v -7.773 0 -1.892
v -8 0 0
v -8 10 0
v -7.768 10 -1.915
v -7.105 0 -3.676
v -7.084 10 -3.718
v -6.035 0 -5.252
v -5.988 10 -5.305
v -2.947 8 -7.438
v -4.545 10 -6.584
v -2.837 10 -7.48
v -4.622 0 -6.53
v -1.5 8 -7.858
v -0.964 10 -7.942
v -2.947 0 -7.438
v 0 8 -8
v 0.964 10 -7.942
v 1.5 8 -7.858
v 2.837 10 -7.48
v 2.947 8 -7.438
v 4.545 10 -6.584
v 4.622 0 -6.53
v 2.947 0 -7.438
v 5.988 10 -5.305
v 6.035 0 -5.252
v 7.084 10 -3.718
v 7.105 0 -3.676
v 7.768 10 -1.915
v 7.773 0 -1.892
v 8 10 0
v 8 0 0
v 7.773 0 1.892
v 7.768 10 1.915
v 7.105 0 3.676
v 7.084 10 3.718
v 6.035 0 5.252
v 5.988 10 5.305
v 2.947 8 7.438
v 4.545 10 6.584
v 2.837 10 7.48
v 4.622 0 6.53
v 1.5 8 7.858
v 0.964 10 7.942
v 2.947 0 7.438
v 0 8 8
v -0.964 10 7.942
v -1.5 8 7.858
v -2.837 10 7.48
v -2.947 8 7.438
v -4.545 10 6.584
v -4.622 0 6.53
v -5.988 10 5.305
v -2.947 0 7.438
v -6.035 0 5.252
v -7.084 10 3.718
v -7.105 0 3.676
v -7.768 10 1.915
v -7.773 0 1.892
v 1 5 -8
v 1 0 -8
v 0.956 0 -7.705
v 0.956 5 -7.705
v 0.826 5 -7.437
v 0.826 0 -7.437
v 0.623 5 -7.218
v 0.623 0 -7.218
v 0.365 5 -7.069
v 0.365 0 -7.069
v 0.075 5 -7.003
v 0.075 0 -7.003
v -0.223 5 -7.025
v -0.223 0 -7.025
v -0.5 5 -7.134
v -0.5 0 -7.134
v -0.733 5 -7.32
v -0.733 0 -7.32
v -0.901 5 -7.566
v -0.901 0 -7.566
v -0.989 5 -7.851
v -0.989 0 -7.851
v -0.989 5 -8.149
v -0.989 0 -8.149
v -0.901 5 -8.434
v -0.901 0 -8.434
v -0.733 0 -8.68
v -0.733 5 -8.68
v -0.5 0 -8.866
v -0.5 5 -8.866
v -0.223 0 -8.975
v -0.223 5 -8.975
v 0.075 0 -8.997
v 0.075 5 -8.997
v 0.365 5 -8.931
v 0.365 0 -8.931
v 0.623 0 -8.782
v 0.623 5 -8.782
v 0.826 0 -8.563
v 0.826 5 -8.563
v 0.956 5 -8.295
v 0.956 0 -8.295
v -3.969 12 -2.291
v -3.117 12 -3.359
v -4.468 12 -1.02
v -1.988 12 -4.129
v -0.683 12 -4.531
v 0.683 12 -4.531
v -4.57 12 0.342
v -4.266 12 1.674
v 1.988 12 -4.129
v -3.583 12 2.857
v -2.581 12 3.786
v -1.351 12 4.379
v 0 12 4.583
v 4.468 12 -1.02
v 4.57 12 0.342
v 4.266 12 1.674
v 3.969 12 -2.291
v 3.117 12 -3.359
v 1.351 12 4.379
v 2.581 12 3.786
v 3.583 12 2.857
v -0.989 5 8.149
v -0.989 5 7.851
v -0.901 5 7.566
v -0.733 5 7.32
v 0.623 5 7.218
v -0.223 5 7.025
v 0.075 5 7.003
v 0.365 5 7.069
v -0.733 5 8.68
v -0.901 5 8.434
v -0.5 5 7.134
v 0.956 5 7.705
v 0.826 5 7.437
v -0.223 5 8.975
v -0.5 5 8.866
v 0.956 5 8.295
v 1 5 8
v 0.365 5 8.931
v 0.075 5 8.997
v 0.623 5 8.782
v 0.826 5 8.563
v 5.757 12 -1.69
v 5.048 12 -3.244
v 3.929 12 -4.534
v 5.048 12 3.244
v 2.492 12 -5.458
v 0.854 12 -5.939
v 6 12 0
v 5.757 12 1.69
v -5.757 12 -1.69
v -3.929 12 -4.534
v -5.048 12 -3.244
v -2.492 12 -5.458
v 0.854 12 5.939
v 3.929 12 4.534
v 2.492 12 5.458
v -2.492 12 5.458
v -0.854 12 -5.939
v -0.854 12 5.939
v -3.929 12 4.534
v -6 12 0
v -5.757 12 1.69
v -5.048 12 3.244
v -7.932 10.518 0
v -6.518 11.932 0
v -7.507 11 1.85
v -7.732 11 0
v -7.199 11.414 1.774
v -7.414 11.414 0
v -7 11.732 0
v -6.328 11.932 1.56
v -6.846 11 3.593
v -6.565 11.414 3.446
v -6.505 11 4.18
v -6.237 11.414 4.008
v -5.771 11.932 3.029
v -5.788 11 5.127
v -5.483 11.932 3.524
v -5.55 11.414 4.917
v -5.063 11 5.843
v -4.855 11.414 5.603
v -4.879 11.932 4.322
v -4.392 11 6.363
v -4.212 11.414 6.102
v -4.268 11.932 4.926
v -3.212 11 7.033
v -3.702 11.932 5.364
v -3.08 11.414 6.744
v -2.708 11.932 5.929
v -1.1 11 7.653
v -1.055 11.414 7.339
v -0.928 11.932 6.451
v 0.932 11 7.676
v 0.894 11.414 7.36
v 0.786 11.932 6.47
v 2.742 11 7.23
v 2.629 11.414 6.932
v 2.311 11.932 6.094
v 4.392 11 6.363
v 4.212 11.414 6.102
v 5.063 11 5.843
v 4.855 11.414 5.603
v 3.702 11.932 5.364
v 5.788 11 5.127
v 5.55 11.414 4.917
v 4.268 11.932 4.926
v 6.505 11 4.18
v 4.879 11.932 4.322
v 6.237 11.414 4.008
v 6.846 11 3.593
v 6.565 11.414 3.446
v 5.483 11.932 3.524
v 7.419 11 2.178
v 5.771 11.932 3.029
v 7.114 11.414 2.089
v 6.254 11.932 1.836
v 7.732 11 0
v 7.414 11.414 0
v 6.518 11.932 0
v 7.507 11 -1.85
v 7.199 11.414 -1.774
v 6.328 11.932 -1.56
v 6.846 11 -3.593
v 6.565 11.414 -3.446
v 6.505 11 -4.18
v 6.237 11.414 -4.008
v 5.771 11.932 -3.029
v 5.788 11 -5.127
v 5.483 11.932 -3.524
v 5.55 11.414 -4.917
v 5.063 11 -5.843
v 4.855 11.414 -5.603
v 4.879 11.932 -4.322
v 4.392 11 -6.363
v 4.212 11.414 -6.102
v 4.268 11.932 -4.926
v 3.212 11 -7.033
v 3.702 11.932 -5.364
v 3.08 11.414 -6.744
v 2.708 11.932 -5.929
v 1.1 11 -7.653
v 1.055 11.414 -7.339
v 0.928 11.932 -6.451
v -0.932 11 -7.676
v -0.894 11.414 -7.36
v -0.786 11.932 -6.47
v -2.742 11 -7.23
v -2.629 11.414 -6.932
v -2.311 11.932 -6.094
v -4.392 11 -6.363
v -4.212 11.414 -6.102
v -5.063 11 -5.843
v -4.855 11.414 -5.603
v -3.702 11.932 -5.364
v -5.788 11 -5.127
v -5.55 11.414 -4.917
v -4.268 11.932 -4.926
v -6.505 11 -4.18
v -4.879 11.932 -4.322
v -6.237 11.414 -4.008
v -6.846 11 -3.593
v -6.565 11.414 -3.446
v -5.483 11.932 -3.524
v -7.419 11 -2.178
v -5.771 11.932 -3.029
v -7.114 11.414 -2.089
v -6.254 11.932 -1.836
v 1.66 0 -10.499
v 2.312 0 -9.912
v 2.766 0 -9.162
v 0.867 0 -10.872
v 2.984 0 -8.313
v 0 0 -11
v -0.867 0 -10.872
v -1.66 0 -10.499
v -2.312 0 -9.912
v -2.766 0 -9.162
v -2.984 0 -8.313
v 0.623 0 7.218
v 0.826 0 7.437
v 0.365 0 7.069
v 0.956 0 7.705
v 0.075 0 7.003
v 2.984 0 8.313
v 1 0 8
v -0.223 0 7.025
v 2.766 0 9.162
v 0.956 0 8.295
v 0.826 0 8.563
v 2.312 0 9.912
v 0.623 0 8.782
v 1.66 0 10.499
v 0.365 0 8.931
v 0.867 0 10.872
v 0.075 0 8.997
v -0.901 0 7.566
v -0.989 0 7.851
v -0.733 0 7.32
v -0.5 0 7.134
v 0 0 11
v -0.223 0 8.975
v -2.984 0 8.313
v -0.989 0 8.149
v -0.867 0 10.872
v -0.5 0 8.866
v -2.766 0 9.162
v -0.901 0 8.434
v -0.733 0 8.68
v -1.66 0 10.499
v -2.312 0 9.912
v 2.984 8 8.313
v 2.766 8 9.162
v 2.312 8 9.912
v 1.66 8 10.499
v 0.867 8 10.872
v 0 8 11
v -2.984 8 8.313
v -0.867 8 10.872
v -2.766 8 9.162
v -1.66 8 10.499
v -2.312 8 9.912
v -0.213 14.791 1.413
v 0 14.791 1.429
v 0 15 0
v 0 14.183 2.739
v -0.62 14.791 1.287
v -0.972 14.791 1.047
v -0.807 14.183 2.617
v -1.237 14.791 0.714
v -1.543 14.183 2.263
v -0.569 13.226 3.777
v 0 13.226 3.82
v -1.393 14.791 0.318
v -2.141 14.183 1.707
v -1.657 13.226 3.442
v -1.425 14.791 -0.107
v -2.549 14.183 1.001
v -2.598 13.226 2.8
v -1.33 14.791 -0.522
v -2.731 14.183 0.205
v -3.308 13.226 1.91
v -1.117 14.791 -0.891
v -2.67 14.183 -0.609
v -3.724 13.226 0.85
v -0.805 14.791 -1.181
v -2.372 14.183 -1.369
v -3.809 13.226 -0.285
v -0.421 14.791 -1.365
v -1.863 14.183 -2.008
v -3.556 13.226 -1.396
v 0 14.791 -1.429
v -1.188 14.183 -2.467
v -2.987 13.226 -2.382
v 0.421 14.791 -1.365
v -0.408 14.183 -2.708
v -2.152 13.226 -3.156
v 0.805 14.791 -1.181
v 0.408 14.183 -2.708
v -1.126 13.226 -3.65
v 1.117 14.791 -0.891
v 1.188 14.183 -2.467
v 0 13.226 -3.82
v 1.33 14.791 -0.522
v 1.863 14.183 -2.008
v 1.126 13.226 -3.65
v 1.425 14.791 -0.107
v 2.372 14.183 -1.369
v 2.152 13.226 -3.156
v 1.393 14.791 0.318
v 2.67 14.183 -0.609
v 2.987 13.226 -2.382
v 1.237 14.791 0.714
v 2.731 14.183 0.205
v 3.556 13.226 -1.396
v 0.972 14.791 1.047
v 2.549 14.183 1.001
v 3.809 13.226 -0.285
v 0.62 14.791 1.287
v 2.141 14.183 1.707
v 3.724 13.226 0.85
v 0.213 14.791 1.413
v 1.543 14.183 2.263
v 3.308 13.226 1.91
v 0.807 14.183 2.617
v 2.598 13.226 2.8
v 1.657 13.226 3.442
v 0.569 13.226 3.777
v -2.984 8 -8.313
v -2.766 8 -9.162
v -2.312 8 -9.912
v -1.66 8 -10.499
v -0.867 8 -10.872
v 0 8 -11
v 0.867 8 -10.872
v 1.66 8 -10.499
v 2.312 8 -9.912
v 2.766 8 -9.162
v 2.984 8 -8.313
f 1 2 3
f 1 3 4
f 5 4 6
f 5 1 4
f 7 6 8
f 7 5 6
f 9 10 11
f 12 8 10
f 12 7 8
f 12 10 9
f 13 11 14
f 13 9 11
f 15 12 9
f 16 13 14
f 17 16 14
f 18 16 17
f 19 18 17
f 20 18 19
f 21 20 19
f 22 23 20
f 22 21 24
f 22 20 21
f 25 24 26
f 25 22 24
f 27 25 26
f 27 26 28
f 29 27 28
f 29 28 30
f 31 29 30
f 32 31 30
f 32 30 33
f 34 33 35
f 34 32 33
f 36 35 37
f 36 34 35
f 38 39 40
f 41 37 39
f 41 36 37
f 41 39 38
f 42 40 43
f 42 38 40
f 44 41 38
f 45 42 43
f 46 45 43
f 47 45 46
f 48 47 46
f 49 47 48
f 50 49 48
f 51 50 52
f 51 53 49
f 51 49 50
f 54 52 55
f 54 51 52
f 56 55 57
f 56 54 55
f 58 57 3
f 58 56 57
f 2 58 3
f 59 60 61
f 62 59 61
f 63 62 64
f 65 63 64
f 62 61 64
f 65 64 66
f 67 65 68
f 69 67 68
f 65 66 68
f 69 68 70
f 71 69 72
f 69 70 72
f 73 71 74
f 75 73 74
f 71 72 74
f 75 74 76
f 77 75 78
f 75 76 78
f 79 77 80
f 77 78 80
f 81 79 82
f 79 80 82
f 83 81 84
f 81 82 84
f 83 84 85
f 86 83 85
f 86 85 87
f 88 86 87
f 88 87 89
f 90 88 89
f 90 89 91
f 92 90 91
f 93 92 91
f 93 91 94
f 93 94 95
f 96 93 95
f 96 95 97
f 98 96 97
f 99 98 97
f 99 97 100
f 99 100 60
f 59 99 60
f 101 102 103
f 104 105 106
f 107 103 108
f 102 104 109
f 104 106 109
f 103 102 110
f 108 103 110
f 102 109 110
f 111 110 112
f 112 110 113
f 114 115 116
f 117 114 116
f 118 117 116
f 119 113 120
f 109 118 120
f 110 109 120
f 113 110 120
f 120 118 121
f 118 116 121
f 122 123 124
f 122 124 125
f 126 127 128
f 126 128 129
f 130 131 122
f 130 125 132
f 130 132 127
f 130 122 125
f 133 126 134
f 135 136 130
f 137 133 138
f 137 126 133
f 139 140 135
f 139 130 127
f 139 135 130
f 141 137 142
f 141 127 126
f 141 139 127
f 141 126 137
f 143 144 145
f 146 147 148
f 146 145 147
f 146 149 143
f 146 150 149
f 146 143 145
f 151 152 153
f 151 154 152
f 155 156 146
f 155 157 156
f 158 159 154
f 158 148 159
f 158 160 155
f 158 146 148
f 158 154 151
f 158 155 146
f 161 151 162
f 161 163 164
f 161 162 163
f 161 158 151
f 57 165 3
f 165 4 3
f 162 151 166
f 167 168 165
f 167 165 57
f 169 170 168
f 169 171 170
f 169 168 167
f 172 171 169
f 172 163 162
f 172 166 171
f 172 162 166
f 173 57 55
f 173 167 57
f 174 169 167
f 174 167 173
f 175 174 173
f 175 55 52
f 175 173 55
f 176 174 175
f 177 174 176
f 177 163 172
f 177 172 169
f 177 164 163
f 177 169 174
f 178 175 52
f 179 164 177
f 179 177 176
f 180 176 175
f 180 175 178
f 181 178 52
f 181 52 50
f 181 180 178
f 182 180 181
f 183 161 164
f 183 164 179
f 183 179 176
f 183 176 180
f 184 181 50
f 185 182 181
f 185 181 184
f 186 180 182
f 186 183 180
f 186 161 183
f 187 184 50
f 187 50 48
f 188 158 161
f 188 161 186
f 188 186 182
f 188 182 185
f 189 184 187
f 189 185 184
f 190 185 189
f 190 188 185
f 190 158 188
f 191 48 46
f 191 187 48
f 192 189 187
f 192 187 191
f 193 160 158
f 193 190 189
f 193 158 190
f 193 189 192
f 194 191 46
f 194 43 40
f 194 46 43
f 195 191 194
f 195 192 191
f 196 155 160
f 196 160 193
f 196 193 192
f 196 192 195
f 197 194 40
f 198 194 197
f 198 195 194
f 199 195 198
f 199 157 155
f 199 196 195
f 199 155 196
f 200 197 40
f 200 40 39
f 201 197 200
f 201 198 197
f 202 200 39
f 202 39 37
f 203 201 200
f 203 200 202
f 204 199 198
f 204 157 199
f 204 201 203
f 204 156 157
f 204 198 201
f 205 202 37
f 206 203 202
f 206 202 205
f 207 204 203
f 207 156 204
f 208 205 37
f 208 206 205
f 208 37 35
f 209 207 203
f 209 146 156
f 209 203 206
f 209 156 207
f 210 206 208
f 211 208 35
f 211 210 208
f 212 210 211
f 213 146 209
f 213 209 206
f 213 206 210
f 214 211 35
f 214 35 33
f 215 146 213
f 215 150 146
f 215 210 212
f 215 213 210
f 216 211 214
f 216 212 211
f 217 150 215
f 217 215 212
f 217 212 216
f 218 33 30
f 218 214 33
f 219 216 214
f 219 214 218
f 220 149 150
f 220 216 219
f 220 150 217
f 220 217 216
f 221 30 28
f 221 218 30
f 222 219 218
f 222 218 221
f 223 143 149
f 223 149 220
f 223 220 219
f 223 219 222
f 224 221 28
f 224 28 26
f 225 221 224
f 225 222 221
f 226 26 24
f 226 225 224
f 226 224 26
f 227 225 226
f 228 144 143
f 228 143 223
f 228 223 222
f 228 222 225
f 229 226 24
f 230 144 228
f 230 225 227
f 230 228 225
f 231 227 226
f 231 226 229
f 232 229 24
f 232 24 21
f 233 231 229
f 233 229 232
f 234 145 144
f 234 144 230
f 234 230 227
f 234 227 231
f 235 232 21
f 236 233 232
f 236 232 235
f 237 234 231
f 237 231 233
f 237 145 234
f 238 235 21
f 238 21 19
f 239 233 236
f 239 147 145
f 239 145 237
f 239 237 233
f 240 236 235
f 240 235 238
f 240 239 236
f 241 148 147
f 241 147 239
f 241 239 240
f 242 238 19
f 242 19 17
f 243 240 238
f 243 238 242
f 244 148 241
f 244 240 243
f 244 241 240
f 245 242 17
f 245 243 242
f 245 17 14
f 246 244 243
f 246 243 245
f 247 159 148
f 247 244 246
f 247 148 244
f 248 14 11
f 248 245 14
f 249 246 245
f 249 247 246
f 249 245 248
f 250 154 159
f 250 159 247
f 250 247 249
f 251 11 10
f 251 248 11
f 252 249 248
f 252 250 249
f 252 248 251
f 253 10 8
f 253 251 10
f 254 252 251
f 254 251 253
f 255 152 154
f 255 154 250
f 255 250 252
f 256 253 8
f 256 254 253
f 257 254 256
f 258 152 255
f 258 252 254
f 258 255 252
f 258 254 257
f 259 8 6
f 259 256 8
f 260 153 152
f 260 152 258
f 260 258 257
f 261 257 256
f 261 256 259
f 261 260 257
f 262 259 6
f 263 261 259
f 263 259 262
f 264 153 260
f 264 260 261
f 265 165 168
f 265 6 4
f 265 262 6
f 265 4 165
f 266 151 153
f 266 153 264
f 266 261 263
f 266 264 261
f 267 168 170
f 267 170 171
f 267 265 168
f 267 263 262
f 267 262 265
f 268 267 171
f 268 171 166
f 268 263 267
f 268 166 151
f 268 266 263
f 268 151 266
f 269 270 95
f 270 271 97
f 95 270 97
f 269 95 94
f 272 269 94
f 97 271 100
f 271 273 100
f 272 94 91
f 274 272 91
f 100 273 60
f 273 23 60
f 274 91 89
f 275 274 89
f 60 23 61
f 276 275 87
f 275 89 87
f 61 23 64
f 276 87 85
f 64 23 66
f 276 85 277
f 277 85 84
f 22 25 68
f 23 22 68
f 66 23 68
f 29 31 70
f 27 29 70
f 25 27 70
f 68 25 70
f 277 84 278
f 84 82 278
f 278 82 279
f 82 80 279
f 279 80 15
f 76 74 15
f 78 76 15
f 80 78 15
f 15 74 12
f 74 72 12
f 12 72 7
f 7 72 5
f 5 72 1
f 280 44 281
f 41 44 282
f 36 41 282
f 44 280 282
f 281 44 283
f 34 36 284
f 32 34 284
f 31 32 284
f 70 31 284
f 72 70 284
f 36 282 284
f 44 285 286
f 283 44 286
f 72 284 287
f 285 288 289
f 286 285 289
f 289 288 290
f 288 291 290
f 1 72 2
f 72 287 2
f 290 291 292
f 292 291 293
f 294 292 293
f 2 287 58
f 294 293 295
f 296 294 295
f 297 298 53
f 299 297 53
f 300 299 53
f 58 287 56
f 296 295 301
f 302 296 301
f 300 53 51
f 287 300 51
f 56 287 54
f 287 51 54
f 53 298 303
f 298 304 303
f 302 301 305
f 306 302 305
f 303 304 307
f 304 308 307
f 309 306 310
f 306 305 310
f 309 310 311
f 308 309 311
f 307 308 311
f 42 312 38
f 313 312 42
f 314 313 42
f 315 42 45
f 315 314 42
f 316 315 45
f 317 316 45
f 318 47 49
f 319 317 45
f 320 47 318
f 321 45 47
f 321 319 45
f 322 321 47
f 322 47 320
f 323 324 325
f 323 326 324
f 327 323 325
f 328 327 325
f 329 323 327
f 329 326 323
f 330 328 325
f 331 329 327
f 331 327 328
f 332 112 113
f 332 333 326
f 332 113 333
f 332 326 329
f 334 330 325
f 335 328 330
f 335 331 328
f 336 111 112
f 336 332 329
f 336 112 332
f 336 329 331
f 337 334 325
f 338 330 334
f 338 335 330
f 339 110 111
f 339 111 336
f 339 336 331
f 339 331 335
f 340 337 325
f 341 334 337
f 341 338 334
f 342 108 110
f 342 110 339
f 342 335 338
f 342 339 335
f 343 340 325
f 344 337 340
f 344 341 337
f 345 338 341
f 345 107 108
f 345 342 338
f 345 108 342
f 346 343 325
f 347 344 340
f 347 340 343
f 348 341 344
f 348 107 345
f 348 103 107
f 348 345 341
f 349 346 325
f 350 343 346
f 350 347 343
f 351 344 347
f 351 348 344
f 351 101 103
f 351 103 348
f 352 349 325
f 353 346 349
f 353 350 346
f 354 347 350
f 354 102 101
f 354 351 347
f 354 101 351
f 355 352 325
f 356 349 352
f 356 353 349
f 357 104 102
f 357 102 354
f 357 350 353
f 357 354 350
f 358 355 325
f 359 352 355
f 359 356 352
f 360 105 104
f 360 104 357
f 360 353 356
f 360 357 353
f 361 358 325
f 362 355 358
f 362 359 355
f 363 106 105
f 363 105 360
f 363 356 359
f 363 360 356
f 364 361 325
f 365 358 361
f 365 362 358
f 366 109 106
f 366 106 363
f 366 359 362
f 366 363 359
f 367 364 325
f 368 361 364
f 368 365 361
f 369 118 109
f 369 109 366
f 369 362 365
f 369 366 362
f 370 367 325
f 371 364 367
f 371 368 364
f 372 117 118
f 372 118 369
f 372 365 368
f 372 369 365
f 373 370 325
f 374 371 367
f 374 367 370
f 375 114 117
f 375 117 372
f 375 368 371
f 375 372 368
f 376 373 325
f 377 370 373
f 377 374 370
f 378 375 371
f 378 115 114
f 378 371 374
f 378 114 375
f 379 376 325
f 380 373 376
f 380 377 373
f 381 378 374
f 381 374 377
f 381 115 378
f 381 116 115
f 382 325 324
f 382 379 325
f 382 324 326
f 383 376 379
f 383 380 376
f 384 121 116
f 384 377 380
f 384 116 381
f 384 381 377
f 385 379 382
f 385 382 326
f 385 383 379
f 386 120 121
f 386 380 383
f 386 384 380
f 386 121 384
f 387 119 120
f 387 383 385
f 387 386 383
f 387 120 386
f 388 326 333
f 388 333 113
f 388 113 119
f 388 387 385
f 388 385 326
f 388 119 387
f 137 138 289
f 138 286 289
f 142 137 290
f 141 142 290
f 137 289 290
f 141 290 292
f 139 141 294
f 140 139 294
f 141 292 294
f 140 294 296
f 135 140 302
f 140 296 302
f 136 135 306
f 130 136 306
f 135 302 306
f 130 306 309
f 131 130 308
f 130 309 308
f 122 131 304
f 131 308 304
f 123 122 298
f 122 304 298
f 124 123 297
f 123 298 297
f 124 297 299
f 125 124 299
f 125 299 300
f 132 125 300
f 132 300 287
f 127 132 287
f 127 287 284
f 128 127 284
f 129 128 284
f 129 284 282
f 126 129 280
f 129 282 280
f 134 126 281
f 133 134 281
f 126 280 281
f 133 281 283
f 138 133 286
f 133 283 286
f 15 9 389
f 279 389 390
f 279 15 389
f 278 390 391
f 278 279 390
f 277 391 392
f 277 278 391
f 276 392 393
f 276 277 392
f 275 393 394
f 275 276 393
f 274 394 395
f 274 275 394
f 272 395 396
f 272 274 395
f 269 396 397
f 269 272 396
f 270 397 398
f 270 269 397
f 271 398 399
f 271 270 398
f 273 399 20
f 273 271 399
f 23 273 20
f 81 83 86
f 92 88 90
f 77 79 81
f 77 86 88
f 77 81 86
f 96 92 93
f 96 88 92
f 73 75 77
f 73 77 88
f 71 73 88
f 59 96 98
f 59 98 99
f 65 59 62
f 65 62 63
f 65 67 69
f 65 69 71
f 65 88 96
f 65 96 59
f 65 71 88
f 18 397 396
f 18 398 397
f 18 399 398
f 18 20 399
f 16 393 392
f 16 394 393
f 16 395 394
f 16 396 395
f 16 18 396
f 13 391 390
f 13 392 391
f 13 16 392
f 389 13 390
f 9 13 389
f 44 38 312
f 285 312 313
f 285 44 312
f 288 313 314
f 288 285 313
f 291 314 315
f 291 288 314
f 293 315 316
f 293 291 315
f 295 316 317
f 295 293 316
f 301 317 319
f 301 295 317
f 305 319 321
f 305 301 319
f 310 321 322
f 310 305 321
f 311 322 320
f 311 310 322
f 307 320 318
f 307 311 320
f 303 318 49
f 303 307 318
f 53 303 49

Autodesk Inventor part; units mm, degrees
ref_plane "YZ Plane" through (0, 0, 0) normal (1, 0, 0) x (0, 1, 0)
ref_plane "XZ Plane" through (0, 0, 0) normal (0, 1, 0) x (-1, 0, 0)
ref_plane "XY Plane" through (0, 0, 0) normal (0, 0, 1) x (1, 0, 0)
sketch "Sketch1" plane through (0, 0, 0) normal (0, 1, 0) x (-1, 0, 0)
  circle A0 centre (0, 0) radius 8
  circle A1 centre (0, -8) radius 3
  circle A2 centre (0, 8) radius 3
  point P0 (2.9468, 7.4375)
  point P1 (-2.9468, 7.4375)
  point P2 (-2.9468, -7.4375)
  point P3 (2.9468, -7.4375)
  dimension "d0" = 16
  dimension "d1" = 6
extrude "Extrusion1" add sketch "Sketch1" along normal blind 12 contours A0 A1 A2 | A2 A0 | A0 A1 picked at (-0.9446, 7.057) picked at (0.9446, -7.057)
extrude "Extrusion2" add sketch "Sketch1" along normal blind 8 contours A0 A2 | A1 A0 picked at (-1.0397, 8.7946) picked at (-1.0397, -8.7946)
fillet "Fillet1" radius 2 1 edges at (-2.9468, 12, 7.4375)
sketch "Sketch2" plane through (0, 12, 0) normal (0, 1, 0) x (1, 0, 0)
  point P0 (0, 0)
sketch "Sketch3" plane through (0, 0, 0) normal (1, 0, 0) x (0, 1, 0)
  circle A0 centre (10, 0) radius 5
  line L0 (12, 6) -> (12, -6) projected
  line L1 (15, 0) -> (5, 0)
  line L2 (0, -7.4375) -> (0, 7.4375) projected
  line L3 (0, -10.4125) -> (0, 10.4125) projected
  line L4 (-4.7416, 0) -> (28.4498, 0) projected
  point P0 (0, 0)
  point P1 (0, 0)
  point P2 (12, 0)
  point P3 (12, -4.5826)
  point P4 (12, 4.5826)
  dimension "d13" = 10
  dimension "d14" = 3
revolve "Revolution1" add sketch "Sketch3" angle 360 about axis through (0, -10, 0) along (0, 1, 0) separate body picked at (12.3332, 2.861) contours L1 L0 A0
sketch "Sketch4" plane through (0, 0, 0) normal (0, -1, 0) x (1, 0, 0)
  arc A0 (-2.9468, -7.4375) -> (2.9468, -7.4375) centre (0, -8) ccw projected
  circle A1 centre (0, -8) radius 1
  arc A2 (2.9468, 7.4375) -> (-2.9468, 7.4375) centre (0, 8) ccw projected
  circle A3 centre (0, 8) radius 1
  point P0 (0, 0)
  dimension "d9" = 2
extrude "Extrusion3" cut sketch "Sketch4" against normal blind 5 bodies 1
properties part number "ball_caster"
